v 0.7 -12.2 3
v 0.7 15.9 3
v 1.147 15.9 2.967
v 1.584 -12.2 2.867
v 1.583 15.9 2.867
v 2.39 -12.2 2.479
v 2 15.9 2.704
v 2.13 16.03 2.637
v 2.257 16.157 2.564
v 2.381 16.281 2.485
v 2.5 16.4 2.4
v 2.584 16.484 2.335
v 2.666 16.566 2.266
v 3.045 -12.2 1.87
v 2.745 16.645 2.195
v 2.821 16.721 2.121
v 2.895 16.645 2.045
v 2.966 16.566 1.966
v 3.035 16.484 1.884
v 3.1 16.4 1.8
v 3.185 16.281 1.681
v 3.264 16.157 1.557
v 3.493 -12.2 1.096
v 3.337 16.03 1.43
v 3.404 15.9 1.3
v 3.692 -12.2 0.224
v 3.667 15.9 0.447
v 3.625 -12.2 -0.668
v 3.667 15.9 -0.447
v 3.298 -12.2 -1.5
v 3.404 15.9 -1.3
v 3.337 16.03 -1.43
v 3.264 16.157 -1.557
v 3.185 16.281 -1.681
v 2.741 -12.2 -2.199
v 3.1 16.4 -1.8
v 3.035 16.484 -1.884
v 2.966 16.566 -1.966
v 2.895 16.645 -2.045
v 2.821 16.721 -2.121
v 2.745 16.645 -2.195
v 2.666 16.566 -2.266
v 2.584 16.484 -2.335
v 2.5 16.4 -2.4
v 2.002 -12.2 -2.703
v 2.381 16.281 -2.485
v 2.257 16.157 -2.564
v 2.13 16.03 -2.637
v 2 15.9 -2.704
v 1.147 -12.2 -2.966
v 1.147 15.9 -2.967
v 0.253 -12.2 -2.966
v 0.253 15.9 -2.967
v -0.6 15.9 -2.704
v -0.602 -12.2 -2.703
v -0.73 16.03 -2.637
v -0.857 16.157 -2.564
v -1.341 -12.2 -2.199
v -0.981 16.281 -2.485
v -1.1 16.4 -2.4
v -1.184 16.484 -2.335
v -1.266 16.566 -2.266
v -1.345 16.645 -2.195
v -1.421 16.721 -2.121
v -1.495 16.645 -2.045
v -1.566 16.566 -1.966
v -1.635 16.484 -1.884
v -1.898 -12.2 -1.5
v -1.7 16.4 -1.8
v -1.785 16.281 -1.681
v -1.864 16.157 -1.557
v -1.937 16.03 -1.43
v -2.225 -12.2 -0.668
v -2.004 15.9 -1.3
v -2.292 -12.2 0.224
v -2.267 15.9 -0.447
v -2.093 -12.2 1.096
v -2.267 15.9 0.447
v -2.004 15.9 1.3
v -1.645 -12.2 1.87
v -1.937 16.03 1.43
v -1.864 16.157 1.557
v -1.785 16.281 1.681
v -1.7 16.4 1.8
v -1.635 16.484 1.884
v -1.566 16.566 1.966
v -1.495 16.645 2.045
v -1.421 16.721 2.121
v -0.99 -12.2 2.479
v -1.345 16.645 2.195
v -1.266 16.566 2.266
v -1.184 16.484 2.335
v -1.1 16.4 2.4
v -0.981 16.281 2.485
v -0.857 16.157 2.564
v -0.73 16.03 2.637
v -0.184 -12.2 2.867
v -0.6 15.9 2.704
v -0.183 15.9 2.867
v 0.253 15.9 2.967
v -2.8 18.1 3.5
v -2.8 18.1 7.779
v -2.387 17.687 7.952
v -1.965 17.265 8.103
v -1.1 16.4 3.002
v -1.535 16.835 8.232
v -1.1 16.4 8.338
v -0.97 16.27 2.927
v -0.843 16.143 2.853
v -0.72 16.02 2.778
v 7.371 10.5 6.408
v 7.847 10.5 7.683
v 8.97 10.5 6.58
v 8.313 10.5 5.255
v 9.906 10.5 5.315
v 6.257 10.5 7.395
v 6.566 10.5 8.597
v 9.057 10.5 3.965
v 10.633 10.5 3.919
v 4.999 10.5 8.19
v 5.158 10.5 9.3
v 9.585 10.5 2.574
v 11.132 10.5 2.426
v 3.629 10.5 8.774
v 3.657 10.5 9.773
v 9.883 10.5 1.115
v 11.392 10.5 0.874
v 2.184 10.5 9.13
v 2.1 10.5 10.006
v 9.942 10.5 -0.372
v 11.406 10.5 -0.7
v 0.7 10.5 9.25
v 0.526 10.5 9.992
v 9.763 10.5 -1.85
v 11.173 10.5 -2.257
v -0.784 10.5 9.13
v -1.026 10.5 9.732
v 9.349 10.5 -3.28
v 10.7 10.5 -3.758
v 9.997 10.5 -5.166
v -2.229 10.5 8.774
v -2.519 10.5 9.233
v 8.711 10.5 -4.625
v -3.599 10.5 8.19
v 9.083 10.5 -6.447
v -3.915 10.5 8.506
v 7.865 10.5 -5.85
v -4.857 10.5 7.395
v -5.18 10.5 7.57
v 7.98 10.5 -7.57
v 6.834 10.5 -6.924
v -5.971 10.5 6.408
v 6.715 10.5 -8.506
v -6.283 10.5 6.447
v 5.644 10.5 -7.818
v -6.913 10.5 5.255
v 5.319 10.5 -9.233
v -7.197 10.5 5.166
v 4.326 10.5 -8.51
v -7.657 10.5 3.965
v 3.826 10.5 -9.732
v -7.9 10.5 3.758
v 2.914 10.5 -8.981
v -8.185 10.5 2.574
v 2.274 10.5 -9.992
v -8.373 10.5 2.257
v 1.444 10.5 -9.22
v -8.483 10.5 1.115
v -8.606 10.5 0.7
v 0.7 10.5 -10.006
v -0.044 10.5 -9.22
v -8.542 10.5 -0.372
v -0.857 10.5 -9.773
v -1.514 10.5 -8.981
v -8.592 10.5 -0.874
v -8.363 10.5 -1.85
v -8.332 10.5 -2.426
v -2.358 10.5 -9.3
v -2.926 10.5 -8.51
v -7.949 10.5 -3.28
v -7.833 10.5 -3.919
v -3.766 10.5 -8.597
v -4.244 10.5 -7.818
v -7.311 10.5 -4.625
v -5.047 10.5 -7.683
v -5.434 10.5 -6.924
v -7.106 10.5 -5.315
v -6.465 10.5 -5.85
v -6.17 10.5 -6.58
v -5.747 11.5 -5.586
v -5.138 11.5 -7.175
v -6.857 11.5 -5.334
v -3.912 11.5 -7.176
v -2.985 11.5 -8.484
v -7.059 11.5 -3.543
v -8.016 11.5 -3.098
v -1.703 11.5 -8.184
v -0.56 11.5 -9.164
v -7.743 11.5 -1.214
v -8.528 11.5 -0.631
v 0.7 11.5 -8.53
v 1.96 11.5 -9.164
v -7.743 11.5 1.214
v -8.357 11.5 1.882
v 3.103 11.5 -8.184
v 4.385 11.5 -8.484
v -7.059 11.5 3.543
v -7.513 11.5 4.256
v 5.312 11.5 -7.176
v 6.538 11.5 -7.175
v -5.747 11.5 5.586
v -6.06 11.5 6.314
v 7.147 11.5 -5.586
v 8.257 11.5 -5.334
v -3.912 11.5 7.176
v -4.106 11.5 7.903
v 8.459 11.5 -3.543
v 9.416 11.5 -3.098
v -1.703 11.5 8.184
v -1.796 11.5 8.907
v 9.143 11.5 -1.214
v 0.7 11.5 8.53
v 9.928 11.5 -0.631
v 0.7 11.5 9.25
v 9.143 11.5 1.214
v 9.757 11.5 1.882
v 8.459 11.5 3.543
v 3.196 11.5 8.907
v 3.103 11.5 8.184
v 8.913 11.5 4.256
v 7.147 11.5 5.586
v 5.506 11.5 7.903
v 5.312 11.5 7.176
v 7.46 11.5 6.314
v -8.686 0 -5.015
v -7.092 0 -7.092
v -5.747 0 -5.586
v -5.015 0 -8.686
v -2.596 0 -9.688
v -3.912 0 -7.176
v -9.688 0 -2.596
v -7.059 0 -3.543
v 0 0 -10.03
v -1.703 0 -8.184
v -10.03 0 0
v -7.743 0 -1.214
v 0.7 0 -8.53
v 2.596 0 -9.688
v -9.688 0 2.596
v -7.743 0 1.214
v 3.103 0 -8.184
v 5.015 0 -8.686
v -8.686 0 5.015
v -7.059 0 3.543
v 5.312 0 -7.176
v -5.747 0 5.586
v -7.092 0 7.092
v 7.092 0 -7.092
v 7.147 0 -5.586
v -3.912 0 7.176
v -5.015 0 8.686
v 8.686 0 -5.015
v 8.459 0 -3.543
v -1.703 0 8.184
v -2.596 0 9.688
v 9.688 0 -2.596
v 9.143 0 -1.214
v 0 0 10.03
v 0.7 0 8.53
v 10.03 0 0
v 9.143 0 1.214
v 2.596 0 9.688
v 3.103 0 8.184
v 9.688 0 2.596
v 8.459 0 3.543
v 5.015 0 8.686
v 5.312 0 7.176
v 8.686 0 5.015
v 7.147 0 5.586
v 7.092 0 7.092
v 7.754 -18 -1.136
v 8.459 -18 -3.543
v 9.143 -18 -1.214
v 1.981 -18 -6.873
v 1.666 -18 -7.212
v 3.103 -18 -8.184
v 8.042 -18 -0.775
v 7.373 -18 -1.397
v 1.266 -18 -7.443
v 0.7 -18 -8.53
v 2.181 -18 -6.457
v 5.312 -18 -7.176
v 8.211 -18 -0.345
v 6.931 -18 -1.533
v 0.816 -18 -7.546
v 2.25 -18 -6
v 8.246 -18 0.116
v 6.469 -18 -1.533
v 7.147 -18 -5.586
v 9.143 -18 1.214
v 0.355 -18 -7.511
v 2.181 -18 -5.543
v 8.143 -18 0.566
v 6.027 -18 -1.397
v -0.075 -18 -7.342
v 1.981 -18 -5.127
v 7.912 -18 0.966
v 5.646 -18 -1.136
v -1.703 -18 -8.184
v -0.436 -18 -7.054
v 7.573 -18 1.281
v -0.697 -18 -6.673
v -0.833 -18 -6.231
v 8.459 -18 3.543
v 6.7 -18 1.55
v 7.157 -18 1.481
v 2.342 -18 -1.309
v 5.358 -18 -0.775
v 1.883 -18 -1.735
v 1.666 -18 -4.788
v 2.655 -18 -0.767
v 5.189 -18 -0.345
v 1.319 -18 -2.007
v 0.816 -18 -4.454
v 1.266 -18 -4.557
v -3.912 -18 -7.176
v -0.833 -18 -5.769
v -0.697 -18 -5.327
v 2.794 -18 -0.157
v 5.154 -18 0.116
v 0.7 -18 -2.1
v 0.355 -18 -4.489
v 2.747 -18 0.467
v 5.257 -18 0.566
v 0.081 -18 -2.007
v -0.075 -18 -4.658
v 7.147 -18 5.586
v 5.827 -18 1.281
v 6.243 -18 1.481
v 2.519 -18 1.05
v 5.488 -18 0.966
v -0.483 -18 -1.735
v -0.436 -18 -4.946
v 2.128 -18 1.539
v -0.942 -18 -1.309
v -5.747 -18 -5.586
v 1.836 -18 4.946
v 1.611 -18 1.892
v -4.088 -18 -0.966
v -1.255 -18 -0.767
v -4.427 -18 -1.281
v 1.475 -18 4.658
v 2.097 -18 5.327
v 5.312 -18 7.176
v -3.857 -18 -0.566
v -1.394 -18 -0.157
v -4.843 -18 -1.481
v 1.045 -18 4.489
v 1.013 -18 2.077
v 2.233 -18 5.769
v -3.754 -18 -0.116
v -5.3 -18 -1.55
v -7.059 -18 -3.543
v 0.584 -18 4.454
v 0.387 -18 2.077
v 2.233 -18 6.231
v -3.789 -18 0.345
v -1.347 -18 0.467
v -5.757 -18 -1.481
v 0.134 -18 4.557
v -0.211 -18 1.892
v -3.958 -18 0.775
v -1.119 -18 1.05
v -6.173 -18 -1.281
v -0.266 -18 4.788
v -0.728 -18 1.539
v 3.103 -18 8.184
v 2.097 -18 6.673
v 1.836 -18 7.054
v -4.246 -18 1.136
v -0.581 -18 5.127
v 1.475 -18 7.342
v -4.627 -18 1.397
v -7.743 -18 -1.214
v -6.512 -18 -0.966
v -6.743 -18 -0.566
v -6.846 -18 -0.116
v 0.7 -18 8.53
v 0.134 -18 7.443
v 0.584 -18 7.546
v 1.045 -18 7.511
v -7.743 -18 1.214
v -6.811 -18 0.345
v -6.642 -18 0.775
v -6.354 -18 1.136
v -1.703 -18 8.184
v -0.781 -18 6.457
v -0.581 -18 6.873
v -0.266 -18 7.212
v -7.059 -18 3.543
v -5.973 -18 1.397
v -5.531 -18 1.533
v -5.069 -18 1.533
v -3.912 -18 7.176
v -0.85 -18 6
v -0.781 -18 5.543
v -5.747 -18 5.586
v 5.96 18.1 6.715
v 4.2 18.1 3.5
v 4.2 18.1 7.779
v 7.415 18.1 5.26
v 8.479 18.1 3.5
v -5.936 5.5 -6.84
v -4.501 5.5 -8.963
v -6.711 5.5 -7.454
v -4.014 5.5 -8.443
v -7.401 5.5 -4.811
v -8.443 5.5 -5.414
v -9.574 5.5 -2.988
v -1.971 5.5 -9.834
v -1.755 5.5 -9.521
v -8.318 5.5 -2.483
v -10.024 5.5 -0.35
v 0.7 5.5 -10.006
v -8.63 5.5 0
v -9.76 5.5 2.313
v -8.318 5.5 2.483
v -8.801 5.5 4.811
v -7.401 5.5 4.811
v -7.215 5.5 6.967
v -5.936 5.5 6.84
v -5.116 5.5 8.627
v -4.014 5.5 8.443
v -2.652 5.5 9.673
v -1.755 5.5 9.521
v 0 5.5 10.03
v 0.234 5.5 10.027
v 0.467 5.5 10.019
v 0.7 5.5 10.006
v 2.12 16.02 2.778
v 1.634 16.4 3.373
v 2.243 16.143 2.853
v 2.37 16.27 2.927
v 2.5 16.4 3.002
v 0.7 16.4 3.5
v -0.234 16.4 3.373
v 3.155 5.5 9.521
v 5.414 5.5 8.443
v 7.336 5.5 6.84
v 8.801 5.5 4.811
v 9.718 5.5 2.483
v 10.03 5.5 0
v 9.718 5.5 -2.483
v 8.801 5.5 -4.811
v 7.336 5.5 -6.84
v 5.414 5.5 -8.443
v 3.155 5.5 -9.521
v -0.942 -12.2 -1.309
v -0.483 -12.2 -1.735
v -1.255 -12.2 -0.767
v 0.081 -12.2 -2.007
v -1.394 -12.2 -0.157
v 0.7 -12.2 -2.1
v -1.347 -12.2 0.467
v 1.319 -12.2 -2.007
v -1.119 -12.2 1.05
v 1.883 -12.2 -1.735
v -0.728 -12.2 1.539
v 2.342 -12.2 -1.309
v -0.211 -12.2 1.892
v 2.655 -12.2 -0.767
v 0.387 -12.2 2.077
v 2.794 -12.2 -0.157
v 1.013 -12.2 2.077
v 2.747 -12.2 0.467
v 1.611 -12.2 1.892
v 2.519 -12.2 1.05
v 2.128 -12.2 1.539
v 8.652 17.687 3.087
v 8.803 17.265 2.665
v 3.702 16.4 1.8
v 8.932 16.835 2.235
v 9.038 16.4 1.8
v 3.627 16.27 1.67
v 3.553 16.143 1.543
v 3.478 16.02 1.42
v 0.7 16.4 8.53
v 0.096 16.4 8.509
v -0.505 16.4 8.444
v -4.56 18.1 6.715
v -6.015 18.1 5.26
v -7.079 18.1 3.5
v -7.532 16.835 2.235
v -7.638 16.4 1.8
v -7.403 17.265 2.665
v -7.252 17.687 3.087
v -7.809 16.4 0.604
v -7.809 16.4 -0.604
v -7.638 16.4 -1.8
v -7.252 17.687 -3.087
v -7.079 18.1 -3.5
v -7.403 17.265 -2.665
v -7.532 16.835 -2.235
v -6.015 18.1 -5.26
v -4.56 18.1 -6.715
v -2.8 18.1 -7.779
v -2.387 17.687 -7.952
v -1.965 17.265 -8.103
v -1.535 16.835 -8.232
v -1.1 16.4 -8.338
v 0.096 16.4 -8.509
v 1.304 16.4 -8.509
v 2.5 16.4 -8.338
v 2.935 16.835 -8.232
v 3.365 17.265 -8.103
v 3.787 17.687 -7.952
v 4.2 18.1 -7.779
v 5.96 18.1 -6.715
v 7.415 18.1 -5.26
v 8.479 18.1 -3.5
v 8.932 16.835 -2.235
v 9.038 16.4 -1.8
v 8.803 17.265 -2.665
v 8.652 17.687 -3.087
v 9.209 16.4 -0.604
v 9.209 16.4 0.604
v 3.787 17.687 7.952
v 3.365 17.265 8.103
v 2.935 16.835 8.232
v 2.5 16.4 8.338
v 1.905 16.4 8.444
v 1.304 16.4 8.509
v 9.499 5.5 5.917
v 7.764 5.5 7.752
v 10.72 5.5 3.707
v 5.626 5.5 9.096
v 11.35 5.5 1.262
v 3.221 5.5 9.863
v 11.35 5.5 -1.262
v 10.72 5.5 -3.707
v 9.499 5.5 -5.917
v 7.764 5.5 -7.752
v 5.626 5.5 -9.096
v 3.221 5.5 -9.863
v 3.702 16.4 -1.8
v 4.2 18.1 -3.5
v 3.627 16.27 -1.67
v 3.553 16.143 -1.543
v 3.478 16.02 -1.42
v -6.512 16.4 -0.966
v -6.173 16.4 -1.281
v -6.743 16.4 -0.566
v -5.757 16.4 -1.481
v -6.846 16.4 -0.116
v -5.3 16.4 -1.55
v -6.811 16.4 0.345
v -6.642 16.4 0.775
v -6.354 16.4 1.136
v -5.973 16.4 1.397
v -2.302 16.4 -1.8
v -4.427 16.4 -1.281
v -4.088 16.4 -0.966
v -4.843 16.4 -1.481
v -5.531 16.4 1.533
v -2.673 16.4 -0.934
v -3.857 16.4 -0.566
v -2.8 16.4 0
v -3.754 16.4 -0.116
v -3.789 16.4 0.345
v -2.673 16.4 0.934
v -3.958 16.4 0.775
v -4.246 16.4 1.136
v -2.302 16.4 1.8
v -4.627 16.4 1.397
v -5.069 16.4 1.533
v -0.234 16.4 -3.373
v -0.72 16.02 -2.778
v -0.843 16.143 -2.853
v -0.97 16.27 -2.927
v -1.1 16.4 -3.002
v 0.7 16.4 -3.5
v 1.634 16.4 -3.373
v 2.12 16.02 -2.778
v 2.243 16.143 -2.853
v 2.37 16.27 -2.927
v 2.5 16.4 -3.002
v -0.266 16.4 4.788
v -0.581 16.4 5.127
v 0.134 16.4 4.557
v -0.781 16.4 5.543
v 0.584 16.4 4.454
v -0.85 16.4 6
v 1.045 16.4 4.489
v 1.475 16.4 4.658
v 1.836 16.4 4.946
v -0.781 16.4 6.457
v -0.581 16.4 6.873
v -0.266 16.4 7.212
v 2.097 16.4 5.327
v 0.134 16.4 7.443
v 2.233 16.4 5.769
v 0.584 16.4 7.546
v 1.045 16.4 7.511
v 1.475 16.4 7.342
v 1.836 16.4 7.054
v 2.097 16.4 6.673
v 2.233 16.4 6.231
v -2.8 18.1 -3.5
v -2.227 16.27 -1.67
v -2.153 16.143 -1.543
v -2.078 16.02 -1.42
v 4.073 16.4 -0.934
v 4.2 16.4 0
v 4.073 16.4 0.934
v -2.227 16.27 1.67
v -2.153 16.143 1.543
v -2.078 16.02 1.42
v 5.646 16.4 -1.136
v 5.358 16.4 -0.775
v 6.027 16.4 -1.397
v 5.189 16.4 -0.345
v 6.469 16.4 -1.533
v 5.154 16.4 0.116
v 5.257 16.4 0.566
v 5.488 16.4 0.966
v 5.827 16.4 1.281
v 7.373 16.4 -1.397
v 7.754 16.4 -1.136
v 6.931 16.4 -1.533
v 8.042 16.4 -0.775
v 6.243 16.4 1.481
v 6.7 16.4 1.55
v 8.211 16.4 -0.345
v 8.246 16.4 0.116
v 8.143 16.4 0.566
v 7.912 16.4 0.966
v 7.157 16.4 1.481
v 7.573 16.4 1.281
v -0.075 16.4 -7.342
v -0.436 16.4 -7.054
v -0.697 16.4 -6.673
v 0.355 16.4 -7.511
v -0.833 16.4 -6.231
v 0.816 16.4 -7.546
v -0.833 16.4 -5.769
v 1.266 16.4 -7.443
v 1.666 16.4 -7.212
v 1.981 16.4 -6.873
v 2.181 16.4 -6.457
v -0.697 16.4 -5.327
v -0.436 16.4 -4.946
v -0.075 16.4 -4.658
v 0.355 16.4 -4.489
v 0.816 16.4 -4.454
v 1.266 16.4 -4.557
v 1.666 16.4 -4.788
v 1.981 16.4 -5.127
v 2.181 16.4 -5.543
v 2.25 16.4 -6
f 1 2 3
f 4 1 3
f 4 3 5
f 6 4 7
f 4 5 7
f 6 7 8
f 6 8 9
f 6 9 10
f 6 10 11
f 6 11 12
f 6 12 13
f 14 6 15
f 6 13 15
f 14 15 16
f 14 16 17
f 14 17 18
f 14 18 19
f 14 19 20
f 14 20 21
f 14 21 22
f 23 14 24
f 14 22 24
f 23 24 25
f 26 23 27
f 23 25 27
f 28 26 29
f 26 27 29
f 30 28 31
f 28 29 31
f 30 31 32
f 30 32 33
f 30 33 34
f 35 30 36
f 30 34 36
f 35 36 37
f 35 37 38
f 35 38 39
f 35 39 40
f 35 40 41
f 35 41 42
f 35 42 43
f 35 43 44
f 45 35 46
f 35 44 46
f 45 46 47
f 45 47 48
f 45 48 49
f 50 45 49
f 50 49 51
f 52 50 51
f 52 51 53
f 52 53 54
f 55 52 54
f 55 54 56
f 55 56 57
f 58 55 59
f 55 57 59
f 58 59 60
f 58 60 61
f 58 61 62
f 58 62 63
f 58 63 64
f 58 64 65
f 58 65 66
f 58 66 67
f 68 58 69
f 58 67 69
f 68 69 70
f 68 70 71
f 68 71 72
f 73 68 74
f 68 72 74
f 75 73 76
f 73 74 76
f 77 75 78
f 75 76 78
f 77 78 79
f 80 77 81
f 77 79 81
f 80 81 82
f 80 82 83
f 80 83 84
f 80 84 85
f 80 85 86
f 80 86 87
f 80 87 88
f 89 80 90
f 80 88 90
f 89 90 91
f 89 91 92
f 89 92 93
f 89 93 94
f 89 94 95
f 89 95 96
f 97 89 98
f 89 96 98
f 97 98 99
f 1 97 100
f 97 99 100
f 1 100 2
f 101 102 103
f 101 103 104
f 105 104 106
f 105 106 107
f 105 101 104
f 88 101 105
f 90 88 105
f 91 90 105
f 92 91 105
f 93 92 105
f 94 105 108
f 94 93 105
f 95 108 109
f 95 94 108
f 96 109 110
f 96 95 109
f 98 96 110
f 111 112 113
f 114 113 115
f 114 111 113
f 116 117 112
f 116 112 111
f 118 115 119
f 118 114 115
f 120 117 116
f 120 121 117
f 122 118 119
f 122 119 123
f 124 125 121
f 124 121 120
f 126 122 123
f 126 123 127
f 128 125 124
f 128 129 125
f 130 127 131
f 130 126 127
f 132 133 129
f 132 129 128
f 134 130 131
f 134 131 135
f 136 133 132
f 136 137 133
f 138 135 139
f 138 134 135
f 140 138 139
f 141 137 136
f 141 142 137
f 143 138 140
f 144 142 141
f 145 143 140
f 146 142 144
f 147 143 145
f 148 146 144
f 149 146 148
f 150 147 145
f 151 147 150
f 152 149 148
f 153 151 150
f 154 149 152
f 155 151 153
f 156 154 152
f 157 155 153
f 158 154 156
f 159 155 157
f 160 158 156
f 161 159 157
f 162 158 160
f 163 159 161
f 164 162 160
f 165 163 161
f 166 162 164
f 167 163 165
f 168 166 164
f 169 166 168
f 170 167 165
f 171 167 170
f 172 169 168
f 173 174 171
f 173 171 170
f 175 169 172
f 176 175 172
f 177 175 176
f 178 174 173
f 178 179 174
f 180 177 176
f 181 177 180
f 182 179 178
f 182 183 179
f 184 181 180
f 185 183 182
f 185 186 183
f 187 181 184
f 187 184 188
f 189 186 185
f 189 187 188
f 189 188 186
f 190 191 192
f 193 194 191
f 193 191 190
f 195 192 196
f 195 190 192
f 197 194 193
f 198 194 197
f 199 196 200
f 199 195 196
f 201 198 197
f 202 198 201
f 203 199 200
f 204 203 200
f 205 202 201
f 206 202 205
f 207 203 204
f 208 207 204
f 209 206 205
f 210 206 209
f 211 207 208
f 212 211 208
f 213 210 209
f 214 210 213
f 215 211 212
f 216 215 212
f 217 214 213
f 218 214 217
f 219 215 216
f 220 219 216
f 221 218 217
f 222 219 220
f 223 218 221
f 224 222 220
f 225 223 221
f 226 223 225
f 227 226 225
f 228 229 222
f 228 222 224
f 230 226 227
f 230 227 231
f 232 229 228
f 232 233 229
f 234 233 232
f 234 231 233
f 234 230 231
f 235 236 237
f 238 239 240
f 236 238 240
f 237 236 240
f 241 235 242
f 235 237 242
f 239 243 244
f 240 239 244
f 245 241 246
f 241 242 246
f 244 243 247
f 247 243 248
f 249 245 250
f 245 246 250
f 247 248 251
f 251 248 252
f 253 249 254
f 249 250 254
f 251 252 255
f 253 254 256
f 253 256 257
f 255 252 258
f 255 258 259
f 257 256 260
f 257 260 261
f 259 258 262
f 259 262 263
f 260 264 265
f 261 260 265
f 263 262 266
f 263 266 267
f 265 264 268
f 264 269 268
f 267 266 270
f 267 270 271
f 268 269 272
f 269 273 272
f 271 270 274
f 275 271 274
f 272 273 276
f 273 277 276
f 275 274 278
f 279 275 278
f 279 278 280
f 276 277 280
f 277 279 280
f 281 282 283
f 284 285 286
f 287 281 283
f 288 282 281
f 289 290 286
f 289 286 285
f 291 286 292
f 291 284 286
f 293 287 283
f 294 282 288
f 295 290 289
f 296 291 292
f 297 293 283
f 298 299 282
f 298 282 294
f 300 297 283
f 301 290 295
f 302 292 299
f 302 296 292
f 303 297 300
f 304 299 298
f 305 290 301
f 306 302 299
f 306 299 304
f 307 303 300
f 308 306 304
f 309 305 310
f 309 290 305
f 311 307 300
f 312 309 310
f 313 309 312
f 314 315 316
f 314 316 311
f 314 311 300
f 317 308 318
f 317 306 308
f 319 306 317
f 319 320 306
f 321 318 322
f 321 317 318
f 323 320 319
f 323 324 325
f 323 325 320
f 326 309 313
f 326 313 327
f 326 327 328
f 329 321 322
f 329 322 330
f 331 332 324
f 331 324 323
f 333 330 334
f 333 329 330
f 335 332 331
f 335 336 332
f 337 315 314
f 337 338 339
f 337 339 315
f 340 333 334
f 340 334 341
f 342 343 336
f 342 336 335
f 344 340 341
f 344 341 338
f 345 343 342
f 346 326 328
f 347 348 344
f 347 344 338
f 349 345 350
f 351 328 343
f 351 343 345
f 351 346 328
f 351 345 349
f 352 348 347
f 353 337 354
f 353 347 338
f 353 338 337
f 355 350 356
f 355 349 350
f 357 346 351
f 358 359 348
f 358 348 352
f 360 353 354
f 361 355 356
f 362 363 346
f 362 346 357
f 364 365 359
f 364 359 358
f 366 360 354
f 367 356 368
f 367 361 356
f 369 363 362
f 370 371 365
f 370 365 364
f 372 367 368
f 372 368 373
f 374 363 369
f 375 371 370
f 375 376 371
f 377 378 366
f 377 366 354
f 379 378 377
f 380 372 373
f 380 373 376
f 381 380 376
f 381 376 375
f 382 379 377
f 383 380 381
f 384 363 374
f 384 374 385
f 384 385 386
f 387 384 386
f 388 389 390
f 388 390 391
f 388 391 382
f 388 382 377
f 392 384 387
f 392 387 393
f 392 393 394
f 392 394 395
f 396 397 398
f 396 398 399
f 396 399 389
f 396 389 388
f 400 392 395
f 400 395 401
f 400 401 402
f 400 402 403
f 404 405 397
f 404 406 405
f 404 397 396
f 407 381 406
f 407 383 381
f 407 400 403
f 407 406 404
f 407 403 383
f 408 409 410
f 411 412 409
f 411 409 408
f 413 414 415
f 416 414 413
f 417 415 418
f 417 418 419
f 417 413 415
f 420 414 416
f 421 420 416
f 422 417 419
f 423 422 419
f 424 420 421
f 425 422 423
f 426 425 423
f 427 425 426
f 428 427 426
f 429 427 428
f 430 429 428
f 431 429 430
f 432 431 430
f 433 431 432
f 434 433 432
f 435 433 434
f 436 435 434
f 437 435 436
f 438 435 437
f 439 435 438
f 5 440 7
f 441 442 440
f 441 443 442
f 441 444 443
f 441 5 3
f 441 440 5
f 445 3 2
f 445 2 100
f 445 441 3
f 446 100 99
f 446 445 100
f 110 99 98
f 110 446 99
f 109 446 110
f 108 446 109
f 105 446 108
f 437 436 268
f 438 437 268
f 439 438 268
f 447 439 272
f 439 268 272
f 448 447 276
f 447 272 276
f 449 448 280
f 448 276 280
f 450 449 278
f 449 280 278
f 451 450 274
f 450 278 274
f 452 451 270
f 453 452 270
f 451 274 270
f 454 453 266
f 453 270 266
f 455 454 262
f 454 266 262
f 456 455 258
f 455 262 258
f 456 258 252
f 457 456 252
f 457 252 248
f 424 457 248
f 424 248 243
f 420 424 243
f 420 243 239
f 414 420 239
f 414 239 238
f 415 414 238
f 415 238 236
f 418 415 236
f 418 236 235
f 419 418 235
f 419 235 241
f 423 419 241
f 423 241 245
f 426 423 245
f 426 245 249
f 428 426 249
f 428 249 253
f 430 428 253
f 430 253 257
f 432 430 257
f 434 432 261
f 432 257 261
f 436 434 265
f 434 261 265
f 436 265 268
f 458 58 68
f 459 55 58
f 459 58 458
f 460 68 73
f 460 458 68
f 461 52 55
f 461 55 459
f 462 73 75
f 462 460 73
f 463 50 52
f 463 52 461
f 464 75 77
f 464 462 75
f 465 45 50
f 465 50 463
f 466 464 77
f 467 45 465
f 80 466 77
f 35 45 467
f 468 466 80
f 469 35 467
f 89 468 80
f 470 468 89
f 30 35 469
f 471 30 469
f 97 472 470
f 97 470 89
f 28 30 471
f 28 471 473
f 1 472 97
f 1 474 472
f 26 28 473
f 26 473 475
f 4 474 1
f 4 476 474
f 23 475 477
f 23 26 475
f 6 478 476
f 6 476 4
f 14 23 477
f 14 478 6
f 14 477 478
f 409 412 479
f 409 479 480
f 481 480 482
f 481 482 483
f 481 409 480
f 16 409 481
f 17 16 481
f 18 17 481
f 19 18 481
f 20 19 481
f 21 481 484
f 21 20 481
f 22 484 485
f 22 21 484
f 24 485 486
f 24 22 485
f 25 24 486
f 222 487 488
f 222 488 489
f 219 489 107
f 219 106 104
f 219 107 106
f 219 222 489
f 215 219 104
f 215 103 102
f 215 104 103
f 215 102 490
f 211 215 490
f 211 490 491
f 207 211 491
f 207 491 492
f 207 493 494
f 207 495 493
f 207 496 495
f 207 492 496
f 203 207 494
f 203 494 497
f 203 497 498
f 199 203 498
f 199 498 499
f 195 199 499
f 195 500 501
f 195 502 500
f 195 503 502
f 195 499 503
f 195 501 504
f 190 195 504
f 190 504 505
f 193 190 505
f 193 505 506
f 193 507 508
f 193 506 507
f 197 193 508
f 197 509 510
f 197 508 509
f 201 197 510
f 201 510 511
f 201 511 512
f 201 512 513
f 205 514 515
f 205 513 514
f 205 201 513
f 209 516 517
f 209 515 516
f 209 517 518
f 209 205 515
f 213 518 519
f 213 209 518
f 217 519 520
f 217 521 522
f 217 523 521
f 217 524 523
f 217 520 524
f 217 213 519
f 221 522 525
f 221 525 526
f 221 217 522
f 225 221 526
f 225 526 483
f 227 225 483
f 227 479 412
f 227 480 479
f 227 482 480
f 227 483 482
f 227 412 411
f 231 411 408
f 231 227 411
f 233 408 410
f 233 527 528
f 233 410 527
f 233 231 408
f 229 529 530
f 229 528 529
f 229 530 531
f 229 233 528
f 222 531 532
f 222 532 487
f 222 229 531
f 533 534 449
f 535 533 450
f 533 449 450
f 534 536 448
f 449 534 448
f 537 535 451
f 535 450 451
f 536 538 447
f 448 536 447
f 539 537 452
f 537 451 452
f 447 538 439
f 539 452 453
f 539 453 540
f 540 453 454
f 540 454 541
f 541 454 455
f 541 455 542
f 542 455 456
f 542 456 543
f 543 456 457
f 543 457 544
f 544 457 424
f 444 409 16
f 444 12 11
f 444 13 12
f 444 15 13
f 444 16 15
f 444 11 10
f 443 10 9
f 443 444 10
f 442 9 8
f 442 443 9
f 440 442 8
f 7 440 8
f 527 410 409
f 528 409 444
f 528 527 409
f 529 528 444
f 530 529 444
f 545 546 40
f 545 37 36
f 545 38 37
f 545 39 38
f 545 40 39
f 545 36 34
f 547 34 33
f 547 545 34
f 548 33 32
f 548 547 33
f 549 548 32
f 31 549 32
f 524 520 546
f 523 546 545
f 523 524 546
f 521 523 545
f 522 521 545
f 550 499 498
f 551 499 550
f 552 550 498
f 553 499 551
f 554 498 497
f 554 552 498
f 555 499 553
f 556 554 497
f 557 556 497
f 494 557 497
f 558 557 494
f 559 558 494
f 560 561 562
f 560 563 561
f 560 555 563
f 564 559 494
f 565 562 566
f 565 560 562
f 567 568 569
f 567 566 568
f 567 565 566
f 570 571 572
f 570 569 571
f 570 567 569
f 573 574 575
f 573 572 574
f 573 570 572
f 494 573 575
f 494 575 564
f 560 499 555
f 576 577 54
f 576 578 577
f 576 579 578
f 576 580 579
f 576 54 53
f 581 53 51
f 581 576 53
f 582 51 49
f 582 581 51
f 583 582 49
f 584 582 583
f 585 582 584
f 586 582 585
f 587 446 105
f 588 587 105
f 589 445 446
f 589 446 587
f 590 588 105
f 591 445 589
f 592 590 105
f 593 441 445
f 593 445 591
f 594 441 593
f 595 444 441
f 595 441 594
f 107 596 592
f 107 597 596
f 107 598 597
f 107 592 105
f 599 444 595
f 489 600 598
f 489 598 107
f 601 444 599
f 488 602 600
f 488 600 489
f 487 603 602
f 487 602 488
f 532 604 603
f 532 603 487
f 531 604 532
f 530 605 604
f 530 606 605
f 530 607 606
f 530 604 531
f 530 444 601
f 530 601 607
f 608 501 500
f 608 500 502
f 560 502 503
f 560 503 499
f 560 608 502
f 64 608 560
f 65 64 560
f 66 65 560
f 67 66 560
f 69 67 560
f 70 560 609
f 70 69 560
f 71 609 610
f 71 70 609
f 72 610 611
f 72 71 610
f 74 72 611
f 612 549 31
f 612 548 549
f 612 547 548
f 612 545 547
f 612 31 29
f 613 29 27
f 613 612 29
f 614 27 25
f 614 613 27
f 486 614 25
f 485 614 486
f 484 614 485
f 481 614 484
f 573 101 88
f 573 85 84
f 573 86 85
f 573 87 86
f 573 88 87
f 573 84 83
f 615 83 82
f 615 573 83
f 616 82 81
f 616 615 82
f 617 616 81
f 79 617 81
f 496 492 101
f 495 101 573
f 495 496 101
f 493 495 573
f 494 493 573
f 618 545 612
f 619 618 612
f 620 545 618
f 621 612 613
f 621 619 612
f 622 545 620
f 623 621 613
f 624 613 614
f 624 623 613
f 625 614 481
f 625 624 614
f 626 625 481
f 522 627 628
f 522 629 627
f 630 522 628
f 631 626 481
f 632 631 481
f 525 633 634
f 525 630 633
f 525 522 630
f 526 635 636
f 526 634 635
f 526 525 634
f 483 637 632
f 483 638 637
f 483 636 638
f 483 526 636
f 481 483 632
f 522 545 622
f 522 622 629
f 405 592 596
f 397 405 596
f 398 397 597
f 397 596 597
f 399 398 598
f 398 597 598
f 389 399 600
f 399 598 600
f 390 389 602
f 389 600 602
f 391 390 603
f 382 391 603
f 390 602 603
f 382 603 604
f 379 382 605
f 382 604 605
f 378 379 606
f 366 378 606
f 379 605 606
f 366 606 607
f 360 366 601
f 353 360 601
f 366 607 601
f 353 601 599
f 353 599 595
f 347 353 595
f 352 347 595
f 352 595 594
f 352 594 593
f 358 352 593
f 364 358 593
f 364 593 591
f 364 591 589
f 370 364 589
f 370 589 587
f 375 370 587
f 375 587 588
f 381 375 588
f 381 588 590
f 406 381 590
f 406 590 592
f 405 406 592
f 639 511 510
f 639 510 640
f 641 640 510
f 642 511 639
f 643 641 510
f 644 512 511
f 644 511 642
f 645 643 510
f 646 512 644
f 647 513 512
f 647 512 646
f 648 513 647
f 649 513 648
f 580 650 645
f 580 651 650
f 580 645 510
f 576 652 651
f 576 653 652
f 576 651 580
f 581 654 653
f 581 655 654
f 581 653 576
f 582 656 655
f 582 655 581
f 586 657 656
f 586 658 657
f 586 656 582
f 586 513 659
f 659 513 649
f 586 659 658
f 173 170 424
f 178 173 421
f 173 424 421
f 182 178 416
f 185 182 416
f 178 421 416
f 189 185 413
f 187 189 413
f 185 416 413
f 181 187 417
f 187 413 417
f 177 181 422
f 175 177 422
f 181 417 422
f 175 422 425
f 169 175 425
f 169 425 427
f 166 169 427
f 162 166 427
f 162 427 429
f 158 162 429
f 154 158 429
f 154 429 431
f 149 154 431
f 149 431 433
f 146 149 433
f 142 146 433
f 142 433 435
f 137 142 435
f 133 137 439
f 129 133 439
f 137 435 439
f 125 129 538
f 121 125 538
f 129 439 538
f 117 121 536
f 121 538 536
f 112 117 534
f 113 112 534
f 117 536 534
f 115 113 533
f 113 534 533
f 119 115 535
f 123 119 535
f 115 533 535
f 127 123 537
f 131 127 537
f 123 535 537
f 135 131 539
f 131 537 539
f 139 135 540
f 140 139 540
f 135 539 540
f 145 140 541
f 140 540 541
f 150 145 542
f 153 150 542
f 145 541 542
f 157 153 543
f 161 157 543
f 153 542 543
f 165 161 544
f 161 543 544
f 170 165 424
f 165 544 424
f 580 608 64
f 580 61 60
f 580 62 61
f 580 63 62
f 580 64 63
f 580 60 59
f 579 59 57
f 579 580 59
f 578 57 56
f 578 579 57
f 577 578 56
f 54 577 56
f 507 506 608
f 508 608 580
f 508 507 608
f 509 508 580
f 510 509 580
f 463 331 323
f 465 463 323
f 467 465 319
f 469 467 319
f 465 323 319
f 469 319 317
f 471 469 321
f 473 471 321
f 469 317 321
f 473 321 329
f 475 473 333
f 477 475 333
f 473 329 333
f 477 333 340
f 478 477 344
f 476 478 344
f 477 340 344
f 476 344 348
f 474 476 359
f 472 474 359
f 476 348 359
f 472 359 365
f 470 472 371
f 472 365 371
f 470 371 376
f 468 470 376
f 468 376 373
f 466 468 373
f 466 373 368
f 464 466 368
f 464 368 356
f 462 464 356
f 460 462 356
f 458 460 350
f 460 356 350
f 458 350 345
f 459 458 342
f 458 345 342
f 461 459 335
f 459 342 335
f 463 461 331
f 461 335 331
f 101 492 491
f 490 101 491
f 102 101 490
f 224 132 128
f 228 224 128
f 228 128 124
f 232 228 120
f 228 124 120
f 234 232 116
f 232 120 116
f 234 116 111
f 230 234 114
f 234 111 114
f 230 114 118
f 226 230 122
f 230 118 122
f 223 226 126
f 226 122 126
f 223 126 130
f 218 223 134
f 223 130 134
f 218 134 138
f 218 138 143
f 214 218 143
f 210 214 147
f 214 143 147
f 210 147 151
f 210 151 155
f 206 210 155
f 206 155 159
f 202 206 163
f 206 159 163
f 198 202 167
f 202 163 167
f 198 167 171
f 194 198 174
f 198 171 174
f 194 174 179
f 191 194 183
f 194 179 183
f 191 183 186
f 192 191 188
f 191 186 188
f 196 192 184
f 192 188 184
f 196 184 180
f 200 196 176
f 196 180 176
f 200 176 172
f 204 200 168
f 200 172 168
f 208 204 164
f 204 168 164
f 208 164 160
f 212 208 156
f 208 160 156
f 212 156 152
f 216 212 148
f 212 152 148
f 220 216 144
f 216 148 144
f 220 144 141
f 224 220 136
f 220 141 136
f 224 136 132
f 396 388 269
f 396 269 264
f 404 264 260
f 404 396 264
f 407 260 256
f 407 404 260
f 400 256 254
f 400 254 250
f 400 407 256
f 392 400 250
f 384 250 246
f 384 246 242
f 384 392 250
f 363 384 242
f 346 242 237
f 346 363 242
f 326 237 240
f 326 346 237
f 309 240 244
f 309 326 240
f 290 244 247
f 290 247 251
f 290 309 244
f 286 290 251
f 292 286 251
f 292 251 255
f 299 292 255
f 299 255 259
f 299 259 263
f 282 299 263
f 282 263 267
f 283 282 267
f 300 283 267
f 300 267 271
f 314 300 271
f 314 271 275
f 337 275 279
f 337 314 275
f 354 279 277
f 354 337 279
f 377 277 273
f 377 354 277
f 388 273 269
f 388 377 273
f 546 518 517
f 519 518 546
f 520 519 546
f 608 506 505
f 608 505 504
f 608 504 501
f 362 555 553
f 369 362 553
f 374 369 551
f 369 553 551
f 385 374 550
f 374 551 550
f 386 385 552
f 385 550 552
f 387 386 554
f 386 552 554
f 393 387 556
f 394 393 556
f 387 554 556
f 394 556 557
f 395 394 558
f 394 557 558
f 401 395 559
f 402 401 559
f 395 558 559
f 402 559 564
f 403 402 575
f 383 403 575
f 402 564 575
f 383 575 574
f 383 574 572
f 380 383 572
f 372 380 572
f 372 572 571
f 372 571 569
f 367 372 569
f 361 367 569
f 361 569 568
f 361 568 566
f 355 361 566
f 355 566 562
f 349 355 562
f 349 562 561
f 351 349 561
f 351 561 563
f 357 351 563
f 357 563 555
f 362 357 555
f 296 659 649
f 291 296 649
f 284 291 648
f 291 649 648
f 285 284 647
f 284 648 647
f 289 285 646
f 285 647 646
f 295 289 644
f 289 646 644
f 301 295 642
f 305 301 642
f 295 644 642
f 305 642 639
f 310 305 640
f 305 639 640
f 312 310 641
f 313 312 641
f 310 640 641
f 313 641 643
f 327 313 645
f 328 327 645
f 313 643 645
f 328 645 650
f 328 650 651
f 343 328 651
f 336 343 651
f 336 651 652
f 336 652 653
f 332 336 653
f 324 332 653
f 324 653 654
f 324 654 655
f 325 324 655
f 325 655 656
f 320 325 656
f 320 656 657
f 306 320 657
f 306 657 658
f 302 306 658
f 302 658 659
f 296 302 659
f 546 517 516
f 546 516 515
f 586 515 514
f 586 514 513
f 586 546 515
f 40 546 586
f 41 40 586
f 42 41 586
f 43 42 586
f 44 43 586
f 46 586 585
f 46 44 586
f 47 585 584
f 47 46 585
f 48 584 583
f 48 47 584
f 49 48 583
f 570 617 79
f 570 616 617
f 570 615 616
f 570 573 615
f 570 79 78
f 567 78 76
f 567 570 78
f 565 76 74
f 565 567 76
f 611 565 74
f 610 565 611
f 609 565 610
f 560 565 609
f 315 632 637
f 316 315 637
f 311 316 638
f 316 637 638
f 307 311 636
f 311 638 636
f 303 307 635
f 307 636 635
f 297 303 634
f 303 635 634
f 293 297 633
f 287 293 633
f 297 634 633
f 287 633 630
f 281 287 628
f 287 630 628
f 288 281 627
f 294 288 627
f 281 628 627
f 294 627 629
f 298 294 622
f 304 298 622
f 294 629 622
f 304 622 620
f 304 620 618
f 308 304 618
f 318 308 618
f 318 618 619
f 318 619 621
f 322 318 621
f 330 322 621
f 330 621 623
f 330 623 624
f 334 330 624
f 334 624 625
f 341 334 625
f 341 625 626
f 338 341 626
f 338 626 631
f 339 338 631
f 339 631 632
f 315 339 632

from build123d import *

# Parameters (mm, degrees)
SKETCH1_R            = 10.03
BOSS_EXTRUDE11_DEPTH = 5.5
SKETCH20_R           = 10.03
BOSS_EXTRUDE12_DEPTH = 5
SKETCH21_R           = 9.25
BOSS_EXTRUDE13_DEPTH = 1
SKETCH22_R           = 8.53
BOSS_EXTRUDE14_DEPTH = 6.6
BOSS_EXTRUDE15_START = 18
SKETCH30_R           = 8.53
BOSS_EXTRUDE15_DEPTH = 18
SKETCH31_R           = 1.55
CUT_EXTRUDE12_DEPTH  = 36.1
SKETCH33_R           = 2.1
CUT_EXTRUDE14_DEPTH  = 5.8
SKETCH36_R           = 3
CUT_EXTRUDE18_DEPTH  = 30.3
SKETCH37_W           = 9.5
SKETCH37_H           = 7
CUT_EXTRUDE19_DEPTH  = 1.7
CIRPATTERN1_COUNT    = 4
CHAMFER1_SIZE        = 1.7
CHAMFER2_SIZE        = 0.5


with BuildPart() as part:
    # Sketch1 → Boss-Extrude11 (new body)
    with BuildSketch(Plane(origin=(0, 0, 0), x_dir=(1, 0, 0), z_dir=(0, 1, 0))):
        with Locations(Location((0, 0, 0), (0, 0, 270))):
            Circle(SKETCH1_R)
    extrude(amount=BOSS_EXTRUDE11_DEPTH)

    # Sketch20 → Boss-Extrude12 (add)
    with BuildSketch(Plane(origin=(0, 5.5, 0), x_dir=(1, 0, 0), z_dir=(0, 1, 0))):
        with Locations(Location((1.4, 0, 0), (0, 0, 94.001961682))):
            Circle(SKETCH20_R)
    extrude(amount=BOSS_EXTRUDE12_DEPTH)

    # Sketch21 → Boss-Extrude13 (add)
    with BuildSketch(Plane(origin=(0, 10.5, 0), x_dir=(1, 0, 0), z_dir=(0, 1, 0))):
        with Locations(Location((0.7, 0, 0), (0, 0, 270))):
            Circle(SKETCH21_R)
    extrude(amount=BOSS_EXTRUDE13_DEPTH)

    # Sketch22 → Boss-Extrude14 (add)
    with BuildSketch(Plane(origin=(0, 11.5, 0), x_dir=(1, 0, 0), z_dir=(0, 1, 0))):
        with Locations(Location((0.7, 0, 0), (0, 0, 270))):
            Circle(SKETCH22_R)
    extrude(amount=BOSS_EXTRUDE14_DEPTH)

    # Sketch30 → Boss-Extrude15 (add)
    with BuildSketch(Plane.XZ.offset(BOSS_EXTRUDE15_START)):
        with Locations(Location((0.7, 0, 0), (0, 0, 90))):
            Circle(SKETCH30_R)
    extrude(amount=-BOSS_EXTRUDE15_DEPTH)

    # Sketch31 → Cut-Extrude12 (cut)
    with BuildSketch(Plane(origin=(0, 18.1, 0), x_dir=(1, 0, 0), z_dir=(0, 1, 0))):
        with Locations(Location((6.7, 0, 0), (0, 0, 270))):
            Circle(SKETCH31_R)
    cut_extrude12 = extrude(amount=-CUT_EXTRUDE12_DEPTH, mode=Mode.SUBTRACT)

    # Sketch33 → Cut-Extrude14 (cut)
    with BuildSketch(Plane.XZ.offset(18)):
        with Locations(Location((0.7, 0, 0), (0, 0, 270))):
            Circle(SKETCH33_R)
    extrude(amount=-CUT_EXTRUDE14_DEPTH, mode=Mode.SUBTRACT)

    # Sketch36 → Cut-Extrude18 (cut)
    with BuildSketch(Plane(origin=(0, 18.1, 0), x_dir=(1, 0, 0), z_dir=(0, 1, 0))):
        with Locations(Location((0.7, 0, 0), (0, 0, 270))):
            Circle(SKETCH36_R)
    extrude(amount=-CUT_EXTRUDE18_DEPTH, mode=Mode.SUBTRACT)

    # Sketch37 → Cut-Extrude19 (cut)
    with BuildSketch(Plane(origin=(0, 18.1, 0), x_dir=(1, 0, 0), z_dir=(0, 1, 0))):
        with Locations((5.45, 0)):
            Rectangle(SKETCH37_W, SKETCH37_H)
    cut_extrude19 = extrude(amount=-CUT_EXTRUDE19_DEPTH, mode=Mode.SUBTRACT)

    # CirPattern1: Cut-Extrude12, Cut-Extrude19 ×4 about axis
    cirpattern1_axis = Axis((0.7, 0, 0), (0, 1, 0))
    add([cut_extrude12.rotate(cirpattern1_axis, i * 360 / CIRPATTERN1_COUNT) for i in range(1, CIRPATTERN1_COUNT)], mode=Mode.SUBTRACT)
    add([cut_extrude19.rotate(cirpattern1_axis, i * 360 / CIRPATTERN1_COUNT) for i in range(1, CIRPATTERN1_COUNT)], mode=Mode.SUBTRACT)

    # Chamfer1
    # the kernel refuses this chamfer: 1.7 mm, written as the material it adds along each edge
    with BuildSketch(Plane(origin=(12.85073632, 16.4, -3.5), x_dir=(0, 0.9996219169112968, -0.027495876610586365), z_dir=(-1, 0, 0))) as chamfer1_piece_1_section:
        Polygon((CHAMFER1_SIZE * 0.999621916911, -CHAMFER1_SIZE * 0.0274958766106), (-CHAMFER1_SIZE * 0.0274958766106, -CHAMFER1_SIZE * 0.999621916911), (0, 0), align=None)
    chamfer1_piece_1 = extrude(amount=8.65073632, mode=Mode.PRIVATE)
    chamfer1_piece_1 = chamfer1_piece_1 & Plane(origin=(0.7, 16.951076754, 0), x_dir=(0, 0, 1), z_dir=(0, -1, 0)) * Cylinder(8.53, 25, mode=Mode.PRIVATE)
    chamfer1_piece_1 = split(chamfer1_piece_1, bisect_by=Plane(origin=(6.450066767, 18.1, -2.924017163), z_dir=(0, -1, 0)), keep=Keep.TOP, mode=Mode.PRIVATE)
    add(chamfer1_piece_1)
    with BuildSketch(Plane(origin=(4.2, 16.4, 3.5), x_dir=(0, 0.9996219169112968, 0.027495876610581792), z_dir=(1, 0, 0))) as chamfer1_piece_2_section:
        Polygon((CHAMFER1_SIZE * 0.999621916911, -CHAMFER1_SIZE * 0.0274958766106), (-CHAMFER1_SIZE * 0.0274958766106, -CHAMFER1_SIZE * 0.999621916911), (0, 0), align=None)
    chamfer1_piece_2 = extrude(amount=8.65073632, mode=Mode.PRIVATE)
    chamfer1_piece_2 = chamfer1_piece_2 & Plane(origin=(0.7, 16.951076754, 0), x_dir=(0, 0, 1), z_dir=(0, -1, 0)) * Cylinder(8.53, 25, mode=Mode.PRIVATE)
    chamfer1_piece_2 = split(chamfer1_piece_2, bisect_by=Plane(origin=(6.450066768, 18.1, 2.924017163), z_dir=(0, -1, 0)), keep=Keep.TOP, mode=Mode.PRIVATE)
    add(chamfer1_piece_2)
    with BuildSketch(Plane(origin=(-2.8, 16.4, -12.15073632), x_dir=(-0.027495876610586365, 0.9996219169112968, 0), z_dir=(0, 0, 1))) as chamfer1_piece_3_section:
        Polygon((CHAMFER1_SIZE * 0.999621916911, -CHAMFER1_SIZE * 0.0274958766106), (-CHAMFER1_SIZE * 0.0274958766106, -CHAMFER1_SIZE * 0.999621916911), (0, 0), align=None)
    chamfer1_piece_3 = extrude(amount=8.65073632, mode=Mode.PRIVATE)
    chamfer1_piece_3 = chamfer1_piece_3 & Plane(origin=(0.7, 16.951076754, 0), x_dir=(0, 0, 1), z_dir=(0, -1, 0)) * Cylinder(8.53, 25, mode=Mode.PRIVATE)
    chamfer1_piece_3 = split(chamfer1_piece_3, bisect_by=Plane(origin=(-2.224017163, 18.1, -5.750066767), z_dir=(0, -1, 0)), keep=Keep.TOP, mode=Mode.PRIVATE)
    add(chamfer1_piece_3)
    with BuildSketch(Plane(origin=(-2.8, 16.4, -3.5), x_dir=(0, 0.9996219169112968, -0.027495876610586365), z_dir=(-1, 0, 0))) as chamfer1_piece_4_section:
        Polygon((CHAMFER1_SIZE * 0.999621916911, -CHAMFER1_SIZE * 0.0274958766106), (-CHAMFER1_SIZE * 0.0274958766106, -CHAMFER1_SIZE * 0.999621916911), (0, 0), align=None)
    chamfer1_piece_4 = extrude(amount=8.65073632, mode=Mode.PRIVATE)
    chamfer1_piece_4 = chamfer1_piece_4 & Plane(origin=(0.7, 16.951076754, 0), x_dir=(0, 0, 1), z_dir=(0, -1, 0)) * Cylinder(8.53, 25, mode=Mode.PRIVATE)
    chamfer1_piece_4 = split(chamfer1_piece_4, bisect_by=Plane(origin=(-5.050066768, 18.1, -2.924017163), z_dir=(0, -1, 0)), keep=Keep.TOP, mode=Mode.PRIVATE)
    add(chamfer1_piece_4)
    with BuildSketch(Plane(origin=(-11.45073632, 16.4, 3.5), x_dir=(0, 0.9996219169112968, 0.027495876610586365), z_dir=(1, 0, 0))) as chamfer1_piece_5_section:
        Polygon((CHAMFER1_SIZE * 0.999621916911, -CHAMFER1_SIZE * 0.0274958766106), (-CHAMFER1_SIZE * 0.0274958766106, -CHAMFER1_SIZE * 0.999621916911), (0, 0), align=None)
    chamfer1_piece_5 = extrude(amount=8.65073632, mode=Mode.PRIVATE)
    chamfer1_piece_5 = chamfer1_piece_5 & Plane(origin=(0.7, 16.951076754, 0), x_dir=(0, 0, 1), z_dir=(0, -1, 0)) * Cylinder(8.53, 25, mode=Mode.PRIVATE)
    chamfer1_piece_5 = split(chamfer1_piece_5, bisect_by=Plane(origin=(-5.050066767, 18.1, 2.924017163), z_dir=(0, -1, 0)), keep=Keep.TOP, mode=Mode.PRIVATE)
    add(chamfer1_piece_5)
    with BuildSketch(Plane(origin=(-2.8, 16.4, 3.5), x_dir=(-0.027495876610586365, 0.9996219169112968, 0), z_dir=(0, 0, 1))) as chamfer1_piece_6_section:
        Polygon((CHAMFER1_SIZE * 0.999621916911, -CHAMFER1_SIZE * 0.0274958766106), (-CHAMFER1_SIZE * 0.0274958766106, -CHAMFER1_SIZE * 0.999621916911), (0, 0), align=None)
    chamfer1_piece_6 = extrude(amount=8.65073632, mode=Mode.PRIVATE)
    chamfer1_piece_6 = chamfer1_piece_6 & Plane(origin=(0.7, 16.951076754, 0), x_dir=(0, 0, 1), z_dir=(0, -1, 0)) * Cylinder(8.53, 25, mode=Mode.PRIVATE)
    chamfer1_piece_6 = split(chamfer1_piece_6, bisect_by=Plane(origin=(-2.224017163, 18.1, 5.750066768), z_dir=(0, -1, 0)), keep=Keep.TOP, mode=Mode.PRIVATE)
    add(chamfer1_piece_6)
    with BuildSketch(Plane(origin=(4.2, 16.4, 12.15073632), x_dir=(0.027495876610586365, 0.9996219169112968, 0), z_dir=(0, 0, -1))) as chamfer1_piece_7_section:
        Polygon((CHAMFER1_SIZE * 0.999621916911, -CHAMFER1_SIZE * 0.0274958766106), (-CHAMFER1_SIZE * 0.0274958766106, -CHAMFER1_SIZE * 0.999621916911), (0, 0), align=None)
    chamfer1_piece_7 = extrude(amount=8.65073632, mode=Mode.PRIVATE)
    chamfer1_piece_7 = chamfer1_piece_7 & Plane(origin=(0.7, 16.951076754, 0), x_dir=(0, 0, 1), z_dir=(0, -1, 0)) * Cylinder(8.53, 25, mode=Mode.PRIVATE)
    chamfer1_piece_7 = split(chamfer1_piece_7, bisect_by=Plane(origin=(3.624017163, 18.1, 5.750066767), z_dir=(0, -1, 0)), keep=Keep.TOP, mode=Mode.PRIVATE)
    add(chamfer1_piece_7)
    with BuildSketch(Plane(origin=(4.2, 16.4, -3.5), x_dir=(0.027495876610586365, 0.9996219169112968, 0), z_dir=(0, 0, -1))) as chamfer1_piece_8_section:
        Polygon((CHAMFER1_SIZE * 0.999621916911, -CHAMFER1_SIZE * 0.0274958766106), (-CHAMFER1_SIZE * 0.0274958766106, -CHAMFER1_SIZE * 0.999621916911), (0, 0), align=None)
    chamfer1_piece_8 = extrude(amount=8.65073632, mode=Mode.PRIVATE)
    chamfer1_piece_8 = chamfer1_piece_8 & Plane(origin=(0.7, 16.951076754, 0), x_dir=(0, 0, 1), z_dir=(0, -1, 0)) * Cylinder(8.53, 25, mode=Mode.PRIVATE)
    chamfer1_piece_8 = split(chamfer1_piece_8, bisect_by=Plane(origin=(3.624017163, 18.1, -5.750066768), z_dir=(0, -1, 0)), keep=Keep.TOP, mode=Mode.PRIVATE)
    add(chamfer1_piece_8)
    with BuildSketch(Plane(origin=(12.85073632, 16.4, -3.5), x_dir=(0, 0.9996219169112968, -0.027495876610586365), z_dir=(-1, 0, 0))) as chamfer1_piece_9a_section:
        Polygon((CHAMFER1_SIZE * 0.999621916911, -CHAMFER1_SIZE * 0.0274958766106), (-CHAMFER1_SIZE * 0.0274958766106, -CHAMFER1_SIZE * 0.999621916911), (0, 0), align=None)
    chamfer1_piece_9a = extrude(amount=13.022597399, mode=Mode.PRIVATE)
    chamfer1_piece_9a = split(chamfer1_piece_9a, bisect_by=Plane(origin=(2.33024723, 18.1, -3.085534958), z_dir=(0, -1, 0)), keep=Keep.TOP, mode=Mode.PRIVATE)
    chamfer1_piece_9a = split(chamfer1_piece_9a, bisect_by=Plane(origin=(4.2, 17.035605809, -3.085534958), z_dir=(-1, 0, 0)), keep=Keep.TOP, mode=Mode.PRIVATE)
    chamfer1_piece_9a = chamfer1_piece_9a - Plane(origin=(0.7, 17.035605809, 0), x_dir=(0, 0, 1), z_dir=(0, 1, 0)) * Cylinder(3, 33, mode=Mode.PRIVATE)
    with BuildSketch(Plane(origin=(4.2, 16.4, 0.87186108), x_dir=(0.027495876610586365, 0.9996219169112968, 0), z_dir=(0, 0, -1))) as chamfer1_piece_9b_section:
        Polygon((CHAMFER1_SIZE * 0.999621916911, -CHAMFER1_SIZE * 0.0274958766106), (-CHAMFER1_SIZE * 0.0274958766106, -CHAMFER1_SIZE * 0.999621916911), (0, 0), align=None)
    chamfer1_piece_9b = extrude(amount=13.022597399, mode=Mode.PRIVATE)
    chamfer1_piece_9b = split(chamfer1_piece_9b, bisect_by=Plane(origin=(3.785535078, 17.035605902, -3.5), z_dir=(0, 0, 1)), keep=Keep.TOP, mode=Mode.PRIVATE)
    chamfer1_piece_9b = split(chamfer1_piece_9b, bisect_by=Plane(origin=(3.785535078, 18.1, -1.630247283), z_dir=(0, -1, 0)), keep=Keep.TOP, mode=Mode.PRIVATE)
    chamfer1_piece_9b = chamfer1_piece_9b - Plane(origin=(0.7, 17.035605902, 0), x_dir=(0, 0, 1), z_dir=(0, 1, 0)) * Cylinder(3, 33, mode=Mode.PRIVATE)
    chamfer1_piece_9 = chamfer1_piece_9a & chamfer1_piece_9b
    add(chamfer1_piece_9)
    with BuildSketch(Plane(origin=(4.2, 16.4, 12.15073632), x_dir=(0.027495876610586365, 0.9996219169112968, 0), z_dir=(0, 0, -1))) as chamfer1_piece_10a_section:
        Polygon((CHAMFER1_SIZE * 0.999621916911, -CHAMFER1_SIZE * 0.0274958766106), (-CHAMFER1_SIZE * 0.0274958766106, -CHAMFER1_SIZE * 0.999621916911), (0, 0), align=None)
    chamfer1_piece_10a = extrude(amount=13.022597399, mode=Mode.PRIVATE)
    chamfer1_piece_10a = split(chamfer1_piece_10a, bisect_by=Plane(origin=(3.785534958, 18.1, 1.63024723), z_dir=(0, -1, 0)), keep=Keep.TOP, mode=Mode.PRIVATE)
    chamfer1_piece_10a = split(chamfer1_piece_10a, bisect_by=Plane(origin=(3.785534958, 17.035605809, 3.5), z_dir=(0, 0, -1)), keep=Keep.TOP, mode=Mode.PRIVATE)
    chamfer1_piece_10a = chamfer1_piece_10a - Plane(origin=(0.7, 17.035605809, 0), x_dir=(0, 0, 1), z_dir=(0, 1, 0)) * Cylinder(3, 33, mode=Mode.PRIVATE)
    with BuildSketch(Plane(origin=(-0.17186108, 16.4, 3.5), x_dir=(0, 0.9996219169112968, 0.027495876610586365), z_dir=(1, 0, 0))) as chamfer1_piece_10b_section:
        Polygon((CHAMFER1_SIZE * 0.999621916911, -CHAMFER1_SIZE * 0.0274958766106), (-CHAMFER1_SIZE * 0.0274958766106, -CHAMFER1_SIZE * 0.999621916911), (0, 0), align=None)
    chamfer1_piece_10b = extrude(amount=13.022597399, mode=Mode.PRIVATE)
    chamfer1_piece_10b = split(chamfer1_piece_10b, bisect_by=Plane(origin=(4.2, 17.035605903, 3.08553508), z_dir=(-1, 0, 0)), keep=Keep.TOP, mode=Mode.PRIVATE)
    chamfer1_piece_10b = split(chamfer1_piece_10b, bisect_by=Plane(origin=(2.330247274, 18.1, 3.08553508), z_dir=(0, -1, 0)), keep=Keep.TOP, mode=Mode.PRIVATE)
    chamfer1_piece_10b = chamfer1_piece_10b - Plane(origin=(0.7, 17.035605903, 0), x_dir=(0, 0, 1), z_dir=(0, 1, 0)) * Cylinder(3, 33, mode=Mode.PRIVATE)
    chamfer1_piece_10 = chamfer1_piece_10a & chamfer1_piece_10b
    add(chamfer1_piece_10)
    with BuildSketch(Plane(origin=(-2.8, 16.4, -12.15073632), x_dir=(-0.027495876610586365, 0.9996219169112968, 0), z_dir=(0, 0, 1))) as chamfer1_piece_11a_section:
        Polygon((CHAMFER1_SIZE * 0.999621916911, -CHAMFER1_SIZE * 0.0274958766106), (-CHAMFER1_SIZE * 0.0274958766106, -CHAMFER1_SIZE * 0.999621916911), (0, 0), align=None)
    chamfer1_piece_11a = extrude(amount=13.022597399, mode=Mode.PRIVATE)
    chamfer1_piece_11a = split(chamfer1_piece_11a, bisect_by=Plane(origin=(-2.385534958, 18.1, -1.63024723), z_dir=(0, -1, 0)), keep=Keep.TOP, mode=Mode.PRIVATE)
    chamfer1_piece_11a = split(chamfer1_piece_11a, bisect_by=Plane(origin=(-2.385534958, 17.035605809, -3.5), z_dir=(0, 0, 1)), keep=Keep.TOP, mode=Mode.PRIVATE)
    chamfer1_piece_11a = chamfer1_piece_11a - Plane(origin=(0.7, 17.035605809, 0), x_dir=(0, 0, 1), z_dir=(0, 1, 0)) * Cylinder(3, 33, mode=Mode.PRIVATE)
    with BuildSketch(Plane(origin=(1.57186108, 16.4, -3.5), x_dir=(0, 0.9996219169112968, -0.027495876610586365), z_dir=(-1, 0, 0))) as chamfer1_piece_11b_section:
        Polygon((CHAMFER1_SIZE * 0.999621916911, -CHAMFER1_SIZE * 0.0274958766106), (-CHAMFER1_SIZE * 0.0274958766106, -CHAMFER1_SIZE * 0.999621916911), (0, 0), align=None)
    chamfer1_piece_11b = extrude(amount=13.022597399, mode=Mode.PRIVATE)
    chamfer1_piece_11b = split(chamfer1_piece_11b, bisect_by=Plane(origin=(-2.8, 17.035605902, -3.085535078), z_dir=(1, 0, 0)), keep=Keep.TOP, mode=Mode.PRIVATE)
    chamfer1_piece_11b = split(chamfer1_piece_11b, bisect_by=Plane(origin=(-0.930247283, 18.1, -3.085535078), z_dir=(0, -1, 0)), keep=Keep.TOP, mode=Mode.PRIVATE)
    chamfer1_piece_11b = chamfer1_piece_11b - Plane(origin=(0.7, 17.035605902, 0), x_dir=(0, 0, 1), z_dir=(0, 1, 0)) * Cylinder(3, 33, mode=Mode.PRIVATE)
    chamfer1_piece_11 = chamfer1_piece_11a & chamfer1_piece_11b
    add(chamfer1_piece_11)
    with BuildSketch(Plane(origin=(-11.45073632, 16.4, 3.5), x_dir=(0, 0.9996219169112968, 0.027495876610586365), z_dir=(1, 0, 0))) as chamfer1_piece_12a_section:
        Polygon((CHAMFER1_SIZE * 0.999621916911, -CHAMFER1_SIZE * 0.0274958766106), (-CHAMFER1_SIZE * 0.0274958766106, -CHAMFER1_SIZE * 0.999621916911), (0, 0), align=None)
    chamfer1_piece_12a = extrude(amount=13.022597399, mode=Mode.PRIVATE)
    chamfer1_piece_12a = split(chamfer1_piece_12a, bisect_by=Plane(origin=(-0.930247276, 18.1, 3.08553506), z_dir=(0, -1, 0)), keep=Keep.TOP, mode=Mode.PRIVATE)
    chamfer1_piece_12a = split(chamfer1_piece_12a, bisect_by=Plane(origin=(-2.8, 17.035605889, 3.08553506), z_dir=(1, 0, 0)), keep=Keep.TOP, mode=Mode.PRIVATE)
    chamfer1_piece_12a = chamfer1_piece_12a - Plane(origin=(0.7, 17.035605889, 0), x_dir=(0, 0, 1), z_dir=(0, 1, 0)) * Cylinder(3, 33, mode=Mode.PRIVATE)
    with BuildSketch(Plane(origin=(-2.8, 16.4, -0.87186108), x_dir=(-0.027495876610586365, 0.9996219169112968, 0), z_dir=(0, 0, 1))) as chamfer1_piece_12b_section:
        Polygon((CHAMFER1_SIZE * 0.999621916911, -CHAMFER1_SIZE * 0.0274958766106), (-CHAMFER1_SIZE * 0.0274958766106, -CHAMFER1_SIZE * 0.999621916911), (0, 0), align=None)
    chamfer1_piece_12b = extrude(amount=13.022597399, mode=Mode.PRIVATE)
    chamfer1_piece_12b = split(chamfer1_piece_12b, bisect_by=Plane(origin=(-2.385535078, 17.035605902, 3.5), z_dir=(0, 0, -1)), keep=Keep.TOP, mode=Mode.PRIVATE)
    chamfer1_piece_12b = split(chamfer1_piece_12b, bisect_by=Plane(origin=(-2.385535078, 18.1, 1.630247283), z_dir=(0, -1, 0)), keep=Keep.TOP, mode=Mode.PRIVATE)
    chamfer1_piece_12b = chamfer1_piece_12b - Plane(origin=(0.7, 17.035605902, 0), x_dir=(0, 0, 1), z_dir=(0, 1, 0)) * Cylinder(3, 33, mode=Mode.PRIVATE)
    chamfer1_piece_12 = chamfer1_piece_12a & chamfer1_piece_12b
    add(chamfer1_piece_12)

    # Chamfer2
    chamfer2_edges = [part.edges().sort_by_distance(p)[0] for p in [
        (-2.3, 16.4, 0),
        (1.648683298, 16.4, 2.846049894),
        (3.7, 16.4, 0),
        (0.7, 16.4, -3),
    ]]
    chamfer(chamfer2_edges, length=CHAMFER2_SIZE)


solid = part.part
